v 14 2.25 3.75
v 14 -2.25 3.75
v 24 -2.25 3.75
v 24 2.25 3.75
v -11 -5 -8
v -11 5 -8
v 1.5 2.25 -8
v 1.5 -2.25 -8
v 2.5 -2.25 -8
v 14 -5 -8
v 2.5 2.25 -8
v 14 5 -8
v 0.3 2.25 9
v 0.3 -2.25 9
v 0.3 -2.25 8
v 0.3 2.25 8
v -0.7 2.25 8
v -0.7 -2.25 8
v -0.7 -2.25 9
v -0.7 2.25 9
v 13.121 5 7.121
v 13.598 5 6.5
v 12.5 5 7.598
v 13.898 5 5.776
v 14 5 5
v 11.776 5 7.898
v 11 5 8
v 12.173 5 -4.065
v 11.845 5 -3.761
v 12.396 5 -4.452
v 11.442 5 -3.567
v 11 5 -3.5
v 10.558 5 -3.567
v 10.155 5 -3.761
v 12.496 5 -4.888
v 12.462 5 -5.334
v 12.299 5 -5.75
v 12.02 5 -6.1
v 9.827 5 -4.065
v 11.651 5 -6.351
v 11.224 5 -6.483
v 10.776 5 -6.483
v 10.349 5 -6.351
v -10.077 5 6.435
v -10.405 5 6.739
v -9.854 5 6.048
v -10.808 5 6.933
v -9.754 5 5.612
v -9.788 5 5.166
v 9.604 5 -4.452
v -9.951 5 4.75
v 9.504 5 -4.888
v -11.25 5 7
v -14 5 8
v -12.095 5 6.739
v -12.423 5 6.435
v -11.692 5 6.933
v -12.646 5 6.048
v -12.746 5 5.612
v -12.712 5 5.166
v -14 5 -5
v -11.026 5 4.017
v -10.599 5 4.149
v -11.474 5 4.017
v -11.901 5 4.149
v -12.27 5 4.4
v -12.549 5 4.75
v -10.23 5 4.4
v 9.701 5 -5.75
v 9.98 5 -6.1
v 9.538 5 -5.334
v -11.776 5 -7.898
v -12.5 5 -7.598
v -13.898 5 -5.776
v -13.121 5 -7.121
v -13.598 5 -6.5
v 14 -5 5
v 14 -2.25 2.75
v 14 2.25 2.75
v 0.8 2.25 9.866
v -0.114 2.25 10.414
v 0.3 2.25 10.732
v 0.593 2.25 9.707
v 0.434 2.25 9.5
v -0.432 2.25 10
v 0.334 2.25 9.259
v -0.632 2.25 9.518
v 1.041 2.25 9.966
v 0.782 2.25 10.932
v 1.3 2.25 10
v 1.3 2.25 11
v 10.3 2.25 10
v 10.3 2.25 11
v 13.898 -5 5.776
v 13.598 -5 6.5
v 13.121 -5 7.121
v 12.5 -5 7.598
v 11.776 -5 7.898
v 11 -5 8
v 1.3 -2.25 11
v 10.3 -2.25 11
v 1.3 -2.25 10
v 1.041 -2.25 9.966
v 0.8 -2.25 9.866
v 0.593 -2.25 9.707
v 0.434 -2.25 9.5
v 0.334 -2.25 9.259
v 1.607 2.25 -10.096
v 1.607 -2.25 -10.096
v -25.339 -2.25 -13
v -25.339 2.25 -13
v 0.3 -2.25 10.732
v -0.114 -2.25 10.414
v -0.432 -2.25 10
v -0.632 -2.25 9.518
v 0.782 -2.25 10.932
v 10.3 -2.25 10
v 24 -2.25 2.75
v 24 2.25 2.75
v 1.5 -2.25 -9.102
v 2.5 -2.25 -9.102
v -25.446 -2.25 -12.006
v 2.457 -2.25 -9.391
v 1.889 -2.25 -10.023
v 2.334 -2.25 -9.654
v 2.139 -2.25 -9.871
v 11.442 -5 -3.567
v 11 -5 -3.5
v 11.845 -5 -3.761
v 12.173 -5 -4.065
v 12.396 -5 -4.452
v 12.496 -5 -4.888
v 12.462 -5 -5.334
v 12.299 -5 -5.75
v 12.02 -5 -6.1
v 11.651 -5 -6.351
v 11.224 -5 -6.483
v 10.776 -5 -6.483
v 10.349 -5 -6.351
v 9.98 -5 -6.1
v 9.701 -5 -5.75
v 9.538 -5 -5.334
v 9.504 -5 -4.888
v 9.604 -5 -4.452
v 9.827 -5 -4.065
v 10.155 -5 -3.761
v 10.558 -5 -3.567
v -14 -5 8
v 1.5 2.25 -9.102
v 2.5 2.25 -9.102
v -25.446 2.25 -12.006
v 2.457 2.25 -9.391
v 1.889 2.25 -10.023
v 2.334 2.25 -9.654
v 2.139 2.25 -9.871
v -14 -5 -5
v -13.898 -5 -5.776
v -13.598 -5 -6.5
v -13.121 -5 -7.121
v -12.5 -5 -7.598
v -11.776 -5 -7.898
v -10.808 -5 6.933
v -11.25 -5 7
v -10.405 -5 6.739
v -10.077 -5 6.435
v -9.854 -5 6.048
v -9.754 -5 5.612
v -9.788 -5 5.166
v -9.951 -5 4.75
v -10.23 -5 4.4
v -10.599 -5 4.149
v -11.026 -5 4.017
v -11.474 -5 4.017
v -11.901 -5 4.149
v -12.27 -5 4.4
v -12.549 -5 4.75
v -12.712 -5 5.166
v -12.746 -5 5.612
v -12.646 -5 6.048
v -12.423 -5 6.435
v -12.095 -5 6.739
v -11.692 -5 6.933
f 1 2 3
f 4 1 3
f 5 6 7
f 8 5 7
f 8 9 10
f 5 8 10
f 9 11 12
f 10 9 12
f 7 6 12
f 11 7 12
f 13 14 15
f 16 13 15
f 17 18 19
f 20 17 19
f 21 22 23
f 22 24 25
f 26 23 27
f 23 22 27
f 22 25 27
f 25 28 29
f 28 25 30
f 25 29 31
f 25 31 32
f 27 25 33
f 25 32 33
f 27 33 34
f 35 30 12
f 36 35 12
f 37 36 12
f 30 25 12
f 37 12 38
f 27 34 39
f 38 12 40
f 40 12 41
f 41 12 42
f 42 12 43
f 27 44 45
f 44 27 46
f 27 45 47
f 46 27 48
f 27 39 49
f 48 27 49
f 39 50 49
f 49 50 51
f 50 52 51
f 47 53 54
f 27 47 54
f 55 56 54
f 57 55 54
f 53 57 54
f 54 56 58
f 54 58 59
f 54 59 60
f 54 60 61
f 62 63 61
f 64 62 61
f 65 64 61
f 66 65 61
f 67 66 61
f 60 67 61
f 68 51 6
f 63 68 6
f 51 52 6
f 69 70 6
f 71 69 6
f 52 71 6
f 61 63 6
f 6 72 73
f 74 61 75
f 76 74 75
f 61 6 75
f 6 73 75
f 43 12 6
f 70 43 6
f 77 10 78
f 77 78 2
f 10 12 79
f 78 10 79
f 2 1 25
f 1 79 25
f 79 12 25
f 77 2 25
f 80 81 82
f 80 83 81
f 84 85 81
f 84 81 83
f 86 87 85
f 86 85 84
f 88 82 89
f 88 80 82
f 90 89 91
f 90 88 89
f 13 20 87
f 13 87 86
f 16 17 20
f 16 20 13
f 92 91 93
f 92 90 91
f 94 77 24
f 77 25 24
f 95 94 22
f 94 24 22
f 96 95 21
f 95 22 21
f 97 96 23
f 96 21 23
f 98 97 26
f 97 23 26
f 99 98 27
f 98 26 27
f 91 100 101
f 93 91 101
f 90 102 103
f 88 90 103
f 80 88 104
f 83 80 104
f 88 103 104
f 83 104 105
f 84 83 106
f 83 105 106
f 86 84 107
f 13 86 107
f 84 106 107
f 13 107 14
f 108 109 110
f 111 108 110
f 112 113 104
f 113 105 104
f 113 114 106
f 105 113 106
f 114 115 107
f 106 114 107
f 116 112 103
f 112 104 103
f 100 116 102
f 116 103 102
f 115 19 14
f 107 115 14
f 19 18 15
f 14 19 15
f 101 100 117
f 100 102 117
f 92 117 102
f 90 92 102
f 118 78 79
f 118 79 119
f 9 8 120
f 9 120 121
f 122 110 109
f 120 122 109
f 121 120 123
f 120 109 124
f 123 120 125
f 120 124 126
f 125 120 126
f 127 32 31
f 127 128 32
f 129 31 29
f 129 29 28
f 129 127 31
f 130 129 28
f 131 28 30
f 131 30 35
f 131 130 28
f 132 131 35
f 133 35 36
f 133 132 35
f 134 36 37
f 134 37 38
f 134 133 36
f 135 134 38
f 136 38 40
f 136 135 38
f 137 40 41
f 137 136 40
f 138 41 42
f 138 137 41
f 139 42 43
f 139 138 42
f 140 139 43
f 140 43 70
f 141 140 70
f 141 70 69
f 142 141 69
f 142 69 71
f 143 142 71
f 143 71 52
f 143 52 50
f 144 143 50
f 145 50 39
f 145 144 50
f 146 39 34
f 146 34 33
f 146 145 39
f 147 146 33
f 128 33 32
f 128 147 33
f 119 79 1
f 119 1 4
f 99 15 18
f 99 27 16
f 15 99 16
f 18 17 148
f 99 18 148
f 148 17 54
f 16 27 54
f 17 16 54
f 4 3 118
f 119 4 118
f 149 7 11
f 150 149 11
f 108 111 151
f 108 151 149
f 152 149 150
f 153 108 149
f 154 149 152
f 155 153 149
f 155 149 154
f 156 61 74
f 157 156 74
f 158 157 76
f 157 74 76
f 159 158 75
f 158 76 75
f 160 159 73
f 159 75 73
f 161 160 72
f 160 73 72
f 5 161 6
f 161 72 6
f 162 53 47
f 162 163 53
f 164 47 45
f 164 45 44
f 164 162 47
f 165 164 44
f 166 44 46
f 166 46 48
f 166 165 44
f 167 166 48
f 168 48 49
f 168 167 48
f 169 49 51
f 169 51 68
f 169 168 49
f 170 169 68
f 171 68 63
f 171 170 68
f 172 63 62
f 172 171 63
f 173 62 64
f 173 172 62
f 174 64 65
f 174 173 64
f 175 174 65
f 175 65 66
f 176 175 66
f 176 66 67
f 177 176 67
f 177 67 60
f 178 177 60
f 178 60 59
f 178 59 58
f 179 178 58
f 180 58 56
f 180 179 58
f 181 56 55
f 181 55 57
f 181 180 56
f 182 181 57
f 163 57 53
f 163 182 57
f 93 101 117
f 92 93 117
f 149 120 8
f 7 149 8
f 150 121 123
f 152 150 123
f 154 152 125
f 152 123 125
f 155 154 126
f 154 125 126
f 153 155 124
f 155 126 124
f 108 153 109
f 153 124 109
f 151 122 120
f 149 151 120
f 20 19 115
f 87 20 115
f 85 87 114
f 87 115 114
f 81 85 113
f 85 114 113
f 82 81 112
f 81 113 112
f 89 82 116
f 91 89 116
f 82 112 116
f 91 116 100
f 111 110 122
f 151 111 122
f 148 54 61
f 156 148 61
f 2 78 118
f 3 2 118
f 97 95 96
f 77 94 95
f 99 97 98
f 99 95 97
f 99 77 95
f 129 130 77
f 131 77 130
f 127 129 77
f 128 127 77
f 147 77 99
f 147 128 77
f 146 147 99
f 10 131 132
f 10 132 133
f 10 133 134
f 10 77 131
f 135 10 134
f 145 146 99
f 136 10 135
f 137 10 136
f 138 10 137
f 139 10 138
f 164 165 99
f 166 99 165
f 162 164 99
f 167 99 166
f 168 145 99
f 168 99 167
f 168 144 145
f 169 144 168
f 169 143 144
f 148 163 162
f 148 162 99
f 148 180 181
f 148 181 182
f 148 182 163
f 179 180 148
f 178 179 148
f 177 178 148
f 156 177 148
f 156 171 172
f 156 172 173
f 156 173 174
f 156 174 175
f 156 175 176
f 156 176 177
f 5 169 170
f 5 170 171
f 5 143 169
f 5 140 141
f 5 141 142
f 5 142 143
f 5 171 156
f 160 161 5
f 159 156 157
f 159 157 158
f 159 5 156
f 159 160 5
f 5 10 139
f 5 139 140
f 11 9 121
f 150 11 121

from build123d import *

# Parameters (mm, degrees)
SKETCH1_R           = 1.5
BOSS_EXTRUDE1_DEPTH = 5
SKETCH1_3_W         = 10
SKETCH1_3_H         = 1
EXTRUDE_THIN1_DEPTH = 2.25


with BuildPart() as part:
    # Sketch1 → Boss-Extrude1 (new, symmetric)
    with BuildSketch(Plane(origin=(0, 0, 0), x_dir=(1, 0, 0), z_dir=(0, 1, 0))):
        with BuildLine():
            Line((-14, 5), (-14, -8))
            Line((-14, -8), (0.3, -8))
            Line((0.3, -8), (11, -8))
            ThreePointArc((11, -8), (13.121320344, -7.121320344), (14, -5))
            Line((14, -5), (14, -2.75))
            Line((14, -2.75), (14, 8))
            Line((14, 8), (2.5, 8))
            Line((2.5, 8), (-11, 8))
            ThreePointArc((-11, 8), (-13.121320344, 7.121320344), (-14, 5))
        make_face()
        with Locations((-11.25, -5.5)):
            Circle(SKETCH1_R, mode=Mode.SUBTRACT)
        with Locations((11, 5)):
            Circle(SKETCH1_R, mode=Mode.SUBTRACT)
    extrude(amount=BOSS_EXTRUDE1_DEPTH, both=True)

    # Sketch1<3> → Extrude-Thin1 (add, symmetric)
    with BuildSketch(Plane(origin=(0, 0, 0), x_dir=(1, 0, 0), z_dir=(0, 1, 0))):
        with BuildLine():
            Line((-25.338821814, 13), (1.607142857, 10.096217126))
            ThreePointArc((1.607142857, 10.096217126), (2.244023809, 9.770126595), (2.5, 9.10197349))
            Line((2.5, 9.10197349), (2.5, 8))
            Line((2.5, 8), (1.5, 8))
            Line((1.5, 8), (1.5, 9.10197349))
            Line((1.5, 9.10197349), (-25.445964671, 12.005756364))
            Line((-25.445964671, 12.005756364), (-25.338821814, 13))
        make_face()
        with BuildLine():
            Line((0.3, -8), (0.3, -9))
            ThreePointArc((0.3, -9), (0.592893219, -9.707106781), (1.3, -10))
            Line((1.3, -10), (10.3, -10))
            Line((10.3, -10), (10.3, -11))
            Line((10.3, -11), (1.3, -11))
            ThreePointArc((1.3, -11), (-0.114213562, -10.414213562), (-0.7, -9))
            Line((-0.7, -9), (-0.7, -8))
            Line((-0.7, -8), (0.3, -8))
        make_face()
        with Locations((19, -3.25)):
            Rectangle(SKETCH1_3_W, SKETCH1_3_H)
    extrude(amount=EXTRUDE_THIN1_DEPTH, both=True)


solid = part.part
